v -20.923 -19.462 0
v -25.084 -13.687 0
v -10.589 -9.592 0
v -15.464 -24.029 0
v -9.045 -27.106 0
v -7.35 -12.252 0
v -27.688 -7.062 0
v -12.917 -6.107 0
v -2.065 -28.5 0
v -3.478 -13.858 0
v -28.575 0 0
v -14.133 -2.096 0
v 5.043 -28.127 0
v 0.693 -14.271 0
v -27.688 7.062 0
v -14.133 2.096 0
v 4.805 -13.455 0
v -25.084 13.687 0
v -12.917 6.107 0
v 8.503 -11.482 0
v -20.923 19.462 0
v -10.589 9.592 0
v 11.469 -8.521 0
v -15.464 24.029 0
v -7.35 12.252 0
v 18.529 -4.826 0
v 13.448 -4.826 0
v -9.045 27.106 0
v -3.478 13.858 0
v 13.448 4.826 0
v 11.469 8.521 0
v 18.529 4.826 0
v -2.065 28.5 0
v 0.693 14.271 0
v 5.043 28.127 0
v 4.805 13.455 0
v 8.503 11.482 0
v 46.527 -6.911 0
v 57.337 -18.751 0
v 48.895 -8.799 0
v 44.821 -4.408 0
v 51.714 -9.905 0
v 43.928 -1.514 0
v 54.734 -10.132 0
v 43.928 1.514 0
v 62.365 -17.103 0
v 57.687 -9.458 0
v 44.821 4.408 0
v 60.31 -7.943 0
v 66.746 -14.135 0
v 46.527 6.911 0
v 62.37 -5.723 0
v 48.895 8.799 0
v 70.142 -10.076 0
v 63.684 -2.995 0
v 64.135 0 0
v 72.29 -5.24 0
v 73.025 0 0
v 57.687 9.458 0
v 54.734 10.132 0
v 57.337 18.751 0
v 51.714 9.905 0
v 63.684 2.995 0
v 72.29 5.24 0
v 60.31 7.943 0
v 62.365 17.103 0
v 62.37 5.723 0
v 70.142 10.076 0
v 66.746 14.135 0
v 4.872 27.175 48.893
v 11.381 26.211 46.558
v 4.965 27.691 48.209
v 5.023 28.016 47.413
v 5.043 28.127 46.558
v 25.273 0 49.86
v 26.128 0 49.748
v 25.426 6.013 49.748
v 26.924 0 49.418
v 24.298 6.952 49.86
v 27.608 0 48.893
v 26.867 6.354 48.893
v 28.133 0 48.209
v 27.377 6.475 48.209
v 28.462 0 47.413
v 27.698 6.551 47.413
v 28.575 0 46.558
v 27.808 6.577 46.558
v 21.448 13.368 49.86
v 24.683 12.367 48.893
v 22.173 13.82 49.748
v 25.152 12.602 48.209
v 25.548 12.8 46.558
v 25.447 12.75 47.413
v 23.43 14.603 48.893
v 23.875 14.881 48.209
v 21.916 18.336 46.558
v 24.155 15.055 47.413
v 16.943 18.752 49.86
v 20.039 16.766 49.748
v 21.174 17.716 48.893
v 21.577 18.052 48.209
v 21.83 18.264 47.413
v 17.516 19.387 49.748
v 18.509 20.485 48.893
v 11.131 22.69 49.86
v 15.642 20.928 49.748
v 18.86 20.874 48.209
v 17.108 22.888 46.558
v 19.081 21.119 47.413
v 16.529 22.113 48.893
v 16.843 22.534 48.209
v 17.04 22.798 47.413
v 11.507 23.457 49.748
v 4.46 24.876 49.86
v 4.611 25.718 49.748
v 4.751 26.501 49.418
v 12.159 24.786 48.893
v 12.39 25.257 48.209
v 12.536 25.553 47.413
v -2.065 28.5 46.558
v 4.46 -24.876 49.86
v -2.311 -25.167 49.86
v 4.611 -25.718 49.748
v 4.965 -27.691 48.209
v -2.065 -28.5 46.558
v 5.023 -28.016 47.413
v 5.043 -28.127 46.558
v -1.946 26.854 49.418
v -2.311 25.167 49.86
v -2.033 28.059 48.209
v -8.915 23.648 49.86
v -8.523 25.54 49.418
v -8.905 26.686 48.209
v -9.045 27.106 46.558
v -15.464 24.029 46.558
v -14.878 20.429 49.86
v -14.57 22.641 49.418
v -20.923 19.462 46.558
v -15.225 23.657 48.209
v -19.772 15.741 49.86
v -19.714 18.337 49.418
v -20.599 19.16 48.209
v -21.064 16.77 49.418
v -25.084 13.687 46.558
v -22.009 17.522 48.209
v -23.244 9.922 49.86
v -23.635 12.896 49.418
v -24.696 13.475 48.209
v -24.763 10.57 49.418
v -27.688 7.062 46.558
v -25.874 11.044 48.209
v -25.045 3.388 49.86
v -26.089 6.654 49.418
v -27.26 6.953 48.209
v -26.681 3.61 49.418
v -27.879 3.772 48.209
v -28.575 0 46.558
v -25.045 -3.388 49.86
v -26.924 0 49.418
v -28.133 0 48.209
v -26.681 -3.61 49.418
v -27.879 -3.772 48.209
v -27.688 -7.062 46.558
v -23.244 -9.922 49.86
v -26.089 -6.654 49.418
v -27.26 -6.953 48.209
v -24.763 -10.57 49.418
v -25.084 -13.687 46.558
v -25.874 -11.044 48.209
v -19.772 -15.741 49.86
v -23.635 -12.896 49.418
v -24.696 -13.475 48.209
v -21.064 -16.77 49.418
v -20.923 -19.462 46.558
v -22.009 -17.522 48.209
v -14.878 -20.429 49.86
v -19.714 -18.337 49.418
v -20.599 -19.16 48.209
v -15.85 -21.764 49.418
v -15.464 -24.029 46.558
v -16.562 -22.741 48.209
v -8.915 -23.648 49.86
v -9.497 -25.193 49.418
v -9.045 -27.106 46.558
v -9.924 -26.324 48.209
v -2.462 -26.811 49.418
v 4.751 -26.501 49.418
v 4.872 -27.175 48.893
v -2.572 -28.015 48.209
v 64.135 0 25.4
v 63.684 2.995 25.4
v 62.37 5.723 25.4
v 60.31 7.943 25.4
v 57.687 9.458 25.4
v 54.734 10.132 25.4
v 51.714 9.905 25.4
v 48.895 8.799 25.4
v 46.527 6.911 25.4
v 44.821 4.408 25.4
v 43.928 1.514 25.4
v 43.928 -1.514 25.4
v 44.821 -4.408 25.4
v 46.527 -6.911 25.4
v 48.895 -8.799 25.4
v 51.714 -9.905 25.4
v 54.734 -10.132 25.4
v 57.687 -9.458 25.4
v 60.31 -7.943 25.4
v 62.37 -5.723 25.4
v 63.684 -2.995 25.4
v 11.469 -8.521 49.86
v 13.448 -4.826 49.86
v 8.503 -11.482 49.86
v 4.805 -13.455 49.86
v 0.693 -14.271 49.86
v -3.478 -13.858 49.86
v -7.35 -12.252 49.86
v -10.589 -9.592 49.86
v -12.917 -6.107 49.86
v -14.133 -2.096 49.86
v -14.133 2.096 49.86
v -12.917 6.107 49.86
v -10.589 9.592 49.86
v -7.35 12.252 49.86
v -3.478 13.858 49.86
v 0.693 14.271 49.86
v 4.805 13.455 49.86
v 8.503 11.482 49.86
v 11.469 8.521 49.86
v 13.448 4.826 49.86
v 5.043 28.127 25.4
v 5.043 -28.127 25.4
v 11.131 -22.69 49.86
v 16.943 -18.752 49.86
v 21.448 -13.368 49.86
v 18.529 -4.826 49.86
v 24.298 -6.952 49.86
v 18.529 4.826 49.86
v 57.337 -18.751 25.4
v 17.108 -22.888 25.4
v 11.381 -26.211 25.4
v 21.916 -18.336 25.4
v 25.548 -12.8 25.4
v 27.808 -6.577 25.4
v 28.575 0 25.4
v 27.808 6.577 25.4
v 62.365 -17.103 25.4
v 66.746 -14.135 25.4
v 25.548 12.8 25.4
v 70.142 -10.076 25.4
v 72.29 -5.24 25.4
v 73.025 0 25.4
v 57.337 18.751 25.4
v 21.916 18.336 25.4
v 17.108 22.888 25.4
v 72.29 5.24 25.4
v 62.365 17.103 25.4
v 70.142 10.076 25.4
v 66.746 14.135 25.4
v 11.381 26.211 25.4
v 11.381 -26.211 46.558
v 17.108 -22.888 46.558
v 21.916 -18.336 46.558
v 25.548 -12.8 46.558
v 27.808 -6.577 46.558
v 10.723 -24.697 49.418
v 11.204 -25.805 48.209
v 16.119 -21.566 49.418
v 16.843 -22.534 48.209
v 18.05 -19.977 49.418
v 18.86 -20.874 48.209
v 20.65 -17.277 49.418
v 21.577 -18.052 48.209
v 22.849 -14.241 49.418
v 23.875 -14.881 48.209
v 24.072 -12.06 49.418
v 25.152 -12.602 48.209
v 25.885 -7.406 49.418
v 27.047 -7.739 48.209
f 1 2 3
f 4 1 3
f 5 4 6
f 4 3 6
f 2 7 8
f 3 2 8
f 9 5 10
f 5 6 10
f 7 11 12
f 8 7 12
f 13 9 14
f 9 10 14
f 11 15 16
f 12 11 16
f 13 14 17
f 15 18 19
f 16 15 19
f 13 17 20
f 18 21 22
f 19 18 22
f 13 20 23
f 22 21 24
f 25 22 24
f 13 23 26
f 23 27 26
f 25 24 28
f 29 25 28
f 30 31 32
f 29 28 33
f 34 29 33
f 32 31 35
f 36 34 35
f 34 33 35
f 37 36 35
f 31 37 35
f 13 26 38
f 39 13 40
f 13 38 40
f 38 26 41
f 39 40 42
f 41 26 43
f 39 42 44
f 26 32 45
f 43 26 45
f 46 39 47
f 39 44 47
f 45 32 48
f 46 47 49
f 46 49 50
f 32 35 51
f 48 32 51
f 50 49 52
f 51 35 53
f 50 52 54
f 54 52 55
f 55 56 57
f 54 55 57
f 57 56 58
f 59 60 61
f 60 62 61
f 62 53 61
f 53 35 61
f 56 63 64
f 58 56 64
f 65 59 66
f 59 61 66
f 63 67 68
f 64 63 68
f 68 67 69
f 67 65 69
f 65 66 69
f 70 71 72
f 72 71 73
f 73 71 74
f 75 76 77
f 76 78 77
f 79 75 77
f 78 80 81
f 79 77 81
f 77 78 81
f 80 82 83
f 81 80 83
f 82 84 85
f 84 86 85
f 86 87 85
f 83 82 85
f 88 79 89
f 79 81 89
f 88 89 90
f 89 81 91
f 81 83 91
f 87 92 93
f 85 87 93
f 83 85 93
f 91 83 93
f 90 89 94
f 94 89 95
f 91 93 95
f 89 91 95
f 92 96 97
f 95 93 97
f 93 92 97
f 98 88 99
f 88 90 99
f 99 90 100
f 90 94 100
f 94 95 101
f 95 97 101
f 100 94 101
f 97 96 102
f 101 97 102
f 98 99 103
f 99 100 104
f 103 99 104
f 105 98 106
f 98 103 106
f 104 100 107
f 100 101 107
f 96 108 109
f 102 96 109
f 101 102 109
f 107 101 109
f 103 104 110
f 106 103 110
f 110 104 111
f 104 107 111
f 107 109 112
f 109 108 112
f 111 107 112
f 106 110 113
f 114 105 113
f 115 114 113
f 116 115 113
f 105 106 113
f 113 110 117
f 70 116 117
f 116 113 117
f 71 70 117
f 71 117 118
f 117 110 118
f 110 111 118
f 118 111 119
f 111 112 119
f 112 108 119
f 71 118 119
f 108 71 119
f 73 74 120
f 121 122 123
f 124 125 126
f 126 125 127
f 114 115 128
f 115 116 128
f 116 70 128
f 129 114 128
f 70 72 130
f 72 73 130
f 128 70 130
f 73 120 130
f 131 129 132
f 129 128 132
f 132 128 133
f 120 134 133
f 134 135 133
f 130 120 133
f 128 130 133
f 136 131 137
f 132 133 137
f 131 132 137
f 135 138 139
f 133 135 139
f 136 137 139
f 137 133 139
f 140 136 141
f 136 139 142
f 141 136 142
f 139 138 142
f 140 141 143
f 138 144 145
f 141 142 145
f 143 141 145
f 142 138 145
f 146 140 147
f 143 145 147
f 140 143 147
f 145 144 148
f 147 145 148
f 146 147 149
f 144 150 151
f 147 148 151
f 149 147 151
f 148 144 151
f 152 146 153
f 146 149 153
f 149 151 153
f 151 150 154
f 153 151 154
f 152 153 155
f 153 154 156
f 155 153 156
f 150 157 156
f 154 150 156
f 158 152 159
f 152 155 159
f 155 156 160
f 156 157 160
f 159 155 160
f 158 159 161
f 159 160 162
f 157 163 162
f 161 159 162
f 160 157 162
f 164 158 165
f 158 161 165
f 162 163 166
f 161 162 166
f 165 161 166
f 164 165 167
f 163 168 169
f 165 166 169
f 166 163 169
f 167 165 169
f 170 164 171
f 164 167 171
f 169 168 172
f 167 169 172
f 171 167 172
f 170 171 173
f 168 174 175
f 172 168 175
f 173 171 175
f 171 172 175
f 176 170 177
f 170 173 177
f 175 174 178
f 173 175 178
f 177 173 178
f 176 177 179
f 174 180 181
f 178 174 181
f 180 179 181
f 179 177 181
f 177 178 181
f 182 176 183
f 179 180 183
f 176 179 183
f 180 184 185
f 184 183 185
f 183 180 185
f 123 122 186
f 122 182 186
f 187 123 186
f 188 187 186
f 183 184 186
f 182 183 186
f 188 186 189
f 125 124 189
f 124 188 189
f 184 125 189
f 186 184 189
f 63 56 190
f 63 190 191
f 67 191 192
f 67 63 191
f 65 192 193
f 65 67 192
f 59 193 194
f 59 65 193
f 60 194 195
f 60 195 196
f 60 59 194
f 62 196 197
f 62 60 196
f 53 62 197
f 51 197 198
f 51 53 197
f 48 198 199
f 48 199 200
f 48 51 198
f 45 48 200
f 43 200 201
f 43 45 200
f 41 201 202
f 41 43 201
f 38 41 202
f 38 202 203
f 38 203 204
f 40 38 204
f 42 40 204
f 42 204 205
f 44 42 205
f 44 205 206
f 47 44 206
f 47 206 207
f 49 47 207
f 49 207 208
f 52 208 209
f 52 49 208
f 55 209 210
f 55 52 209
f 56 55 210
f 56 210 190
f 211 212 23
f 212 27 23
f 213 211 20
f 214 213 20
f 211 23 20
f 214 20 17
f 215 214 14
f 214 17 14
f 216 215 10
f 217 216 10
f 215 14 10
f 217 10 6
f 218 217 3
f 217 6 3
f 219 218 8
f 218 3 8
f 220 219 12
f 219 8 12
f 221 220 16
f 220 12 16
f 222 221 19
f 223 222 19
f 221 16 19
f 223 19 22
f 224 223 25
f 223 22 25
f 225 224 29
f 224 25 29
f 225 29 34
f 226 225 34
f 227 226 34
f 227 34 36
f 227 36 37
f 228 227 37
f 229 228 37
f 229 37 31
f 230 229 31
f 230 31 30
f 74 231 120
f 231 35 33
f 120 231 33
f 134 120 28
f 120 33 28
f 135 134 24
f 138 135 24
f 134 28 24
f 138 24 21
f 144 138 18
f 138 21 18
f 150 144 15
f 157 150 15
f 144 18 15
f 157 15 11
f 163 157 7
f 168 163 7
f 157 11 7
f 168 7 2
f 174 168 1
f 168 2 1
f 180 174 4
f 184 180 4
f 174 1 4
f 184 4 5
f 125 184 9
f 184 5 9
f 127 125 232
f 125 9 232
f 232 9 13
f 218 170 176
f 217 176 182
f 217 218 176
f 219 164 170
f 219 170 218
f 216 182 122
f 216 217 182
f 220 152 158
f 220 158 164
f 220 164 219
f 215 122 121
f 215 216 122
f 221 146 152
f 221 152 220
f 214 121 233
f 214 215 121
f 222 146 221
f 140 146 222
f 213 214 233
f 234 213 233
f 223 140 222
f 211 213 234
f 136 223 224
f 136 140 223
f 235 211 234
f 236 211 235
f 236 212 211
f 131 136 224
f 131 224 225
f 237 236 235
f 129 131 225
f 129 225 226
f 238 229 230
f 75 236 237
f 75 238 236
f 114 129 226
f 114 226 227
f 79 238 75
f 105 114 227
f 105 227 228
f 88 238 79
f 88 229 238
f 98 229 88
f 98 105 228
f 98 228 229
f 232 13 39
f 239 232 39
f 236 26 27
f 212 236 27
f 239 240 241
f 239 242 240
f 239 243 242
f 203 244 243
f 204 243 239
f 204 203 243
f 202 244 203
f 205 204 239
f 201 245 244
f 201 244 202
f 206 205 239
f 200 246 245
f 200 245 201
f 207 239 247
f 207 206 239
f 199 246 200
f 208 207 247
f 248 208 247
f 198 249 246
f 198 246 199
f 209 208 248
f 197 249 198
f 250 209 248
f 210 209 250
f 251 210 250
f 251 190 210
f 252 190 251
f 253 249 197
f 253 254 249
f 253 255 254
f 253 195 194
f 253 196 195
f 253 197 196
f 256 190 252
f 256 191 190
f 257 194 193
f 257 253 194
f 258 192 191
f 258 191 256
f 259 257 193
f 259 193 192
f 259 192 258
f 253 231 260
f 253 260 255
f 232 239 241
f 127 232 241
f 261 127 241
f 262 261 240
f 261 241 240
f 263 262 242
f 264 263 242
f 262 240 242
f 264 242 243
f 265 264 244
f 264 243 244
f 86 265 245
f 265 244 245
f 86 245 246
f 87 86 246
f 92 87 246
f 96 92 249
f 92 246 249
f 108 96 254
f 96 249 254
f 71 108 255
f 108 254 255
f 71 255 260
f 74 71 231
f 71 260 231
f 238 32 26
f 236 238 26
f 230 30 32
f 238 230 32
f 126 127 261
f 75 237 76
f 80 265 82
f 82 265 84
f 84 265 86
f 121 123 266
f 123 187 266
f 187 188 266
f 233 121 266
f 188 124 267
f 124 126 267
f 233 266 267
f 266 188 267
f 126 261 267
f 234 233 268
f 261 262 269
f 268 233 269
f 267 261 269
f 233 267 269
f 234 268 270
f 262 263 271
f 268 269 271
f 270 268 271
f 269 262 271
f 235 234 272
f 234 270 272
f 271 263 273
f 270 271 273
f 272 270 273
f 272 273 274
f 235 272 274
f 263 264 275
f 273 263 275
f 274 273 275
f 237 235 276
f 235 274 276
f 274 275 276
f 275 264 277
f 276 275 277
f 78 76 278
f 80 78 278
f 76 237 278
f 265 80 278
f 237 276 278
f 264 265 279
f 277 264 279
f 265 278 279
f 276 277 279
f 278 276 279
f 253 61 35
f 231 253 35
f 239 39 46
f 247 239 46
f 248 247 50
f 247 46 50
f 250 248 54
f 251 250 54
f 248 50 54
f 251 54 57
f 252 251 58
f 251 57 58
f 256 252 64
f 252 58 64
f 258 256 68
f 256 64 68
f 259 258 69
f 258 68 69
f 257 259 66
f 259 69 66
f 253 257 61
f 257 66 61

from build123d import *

# Parameters (mm, degrees)
F0_R     = 10.16
F1_DEPTH = 25.4
F3_DEPTH = 24.4602
F4_R     = 3.302


with BuildPart() as f1:
    # F0 (on Top) → F1 (new body)
    with BuildSketch(Plane.XY):
        with BuildLine():
            ThreePointArc((5.042647, 28.126541), (21.916025, 18.336262), (28.575, 0))
            ThreePointArc((28.575, 0), (21.916025, -18.336261), (5.042648, -28.126541))
            Line((5.042648, -28.126541), (57.336765, -18.751028))
            ThreePointArc((57.336765, -18.751028), (73.025, 0), (57.336765, 18.751028))
            Line((57.336765, 18.751028), (5.042647, 28.126541))
        make_face()
        with Locations((53.975, 0)):
            Circle(F0_R, mode=Mode.SUBTRACT)
        with BuildLine():
            ThreePointArc((5.042648, -28.126541), (21.916025, -18.336261), (28.575, 0))
            ThreePointArc((28.575, 0), (21.916025, 18.336262), (5.042647, 28.126541))
            ThreePointArc((5.042647, 28.126541), (-28.575, 0), (5.042648, -28.126541))
        make_face()
        with BuildLine():
            ThreePointArc((13.447765, -4.826), (-14.2875, 0), (13.447765, 4.826))
            Line((13.447765, 4.826), (18.5293, 4.826))
            Line((18.5293, 4.826), (18.5293, 0))
            Line((18.5293, 0), (18.5293, -4.826))
            Line((18.5293, -4.826), (13.447765, -4.826))
        make_face(mode=Mode.SUBTRACT)
    extrude(amount=F1_DEPTH)

    # F2 (on face) → F3 (join)
    with BuildSketch(Plane.XY.offset(25.4)):
        with BuildLine():
            ThreePointArc((5.042648, -28.126541), (21.916025, -18.336261), (28.575, 0))
            ThreePointArc((28.575, 0), (21.916025, 18.336262), (5.042647, 28.126541))
            ThreePointArc((5.042647, 28.126541), (-28.575, 0), (5.042648, -28.126541))
        make_face()
        with BuildLine():
            ThreePointArc((13.447765, -4.826), (-14.2875, 0), (13.447765, 4.826))
            Line((13.447765, 4.826), (18.5293, 4.826))
            Line((18.5293, 4.826), (18.5293, -4.826))
            Line((18.5293, -4.826), (13.447765, -4.826))
        make_face(mode=Mode.SUBTRACT)
    extrude(amount=F3_DEPTH)

    # F4
    f4_edges = [f1.edges().sort_by_distance(p)[0] for p in [
        (-5.042648, 28.126541, 49.8602),
    ]]
    fillet(f4_edges, radius=F4_R)


solid = f1.part
